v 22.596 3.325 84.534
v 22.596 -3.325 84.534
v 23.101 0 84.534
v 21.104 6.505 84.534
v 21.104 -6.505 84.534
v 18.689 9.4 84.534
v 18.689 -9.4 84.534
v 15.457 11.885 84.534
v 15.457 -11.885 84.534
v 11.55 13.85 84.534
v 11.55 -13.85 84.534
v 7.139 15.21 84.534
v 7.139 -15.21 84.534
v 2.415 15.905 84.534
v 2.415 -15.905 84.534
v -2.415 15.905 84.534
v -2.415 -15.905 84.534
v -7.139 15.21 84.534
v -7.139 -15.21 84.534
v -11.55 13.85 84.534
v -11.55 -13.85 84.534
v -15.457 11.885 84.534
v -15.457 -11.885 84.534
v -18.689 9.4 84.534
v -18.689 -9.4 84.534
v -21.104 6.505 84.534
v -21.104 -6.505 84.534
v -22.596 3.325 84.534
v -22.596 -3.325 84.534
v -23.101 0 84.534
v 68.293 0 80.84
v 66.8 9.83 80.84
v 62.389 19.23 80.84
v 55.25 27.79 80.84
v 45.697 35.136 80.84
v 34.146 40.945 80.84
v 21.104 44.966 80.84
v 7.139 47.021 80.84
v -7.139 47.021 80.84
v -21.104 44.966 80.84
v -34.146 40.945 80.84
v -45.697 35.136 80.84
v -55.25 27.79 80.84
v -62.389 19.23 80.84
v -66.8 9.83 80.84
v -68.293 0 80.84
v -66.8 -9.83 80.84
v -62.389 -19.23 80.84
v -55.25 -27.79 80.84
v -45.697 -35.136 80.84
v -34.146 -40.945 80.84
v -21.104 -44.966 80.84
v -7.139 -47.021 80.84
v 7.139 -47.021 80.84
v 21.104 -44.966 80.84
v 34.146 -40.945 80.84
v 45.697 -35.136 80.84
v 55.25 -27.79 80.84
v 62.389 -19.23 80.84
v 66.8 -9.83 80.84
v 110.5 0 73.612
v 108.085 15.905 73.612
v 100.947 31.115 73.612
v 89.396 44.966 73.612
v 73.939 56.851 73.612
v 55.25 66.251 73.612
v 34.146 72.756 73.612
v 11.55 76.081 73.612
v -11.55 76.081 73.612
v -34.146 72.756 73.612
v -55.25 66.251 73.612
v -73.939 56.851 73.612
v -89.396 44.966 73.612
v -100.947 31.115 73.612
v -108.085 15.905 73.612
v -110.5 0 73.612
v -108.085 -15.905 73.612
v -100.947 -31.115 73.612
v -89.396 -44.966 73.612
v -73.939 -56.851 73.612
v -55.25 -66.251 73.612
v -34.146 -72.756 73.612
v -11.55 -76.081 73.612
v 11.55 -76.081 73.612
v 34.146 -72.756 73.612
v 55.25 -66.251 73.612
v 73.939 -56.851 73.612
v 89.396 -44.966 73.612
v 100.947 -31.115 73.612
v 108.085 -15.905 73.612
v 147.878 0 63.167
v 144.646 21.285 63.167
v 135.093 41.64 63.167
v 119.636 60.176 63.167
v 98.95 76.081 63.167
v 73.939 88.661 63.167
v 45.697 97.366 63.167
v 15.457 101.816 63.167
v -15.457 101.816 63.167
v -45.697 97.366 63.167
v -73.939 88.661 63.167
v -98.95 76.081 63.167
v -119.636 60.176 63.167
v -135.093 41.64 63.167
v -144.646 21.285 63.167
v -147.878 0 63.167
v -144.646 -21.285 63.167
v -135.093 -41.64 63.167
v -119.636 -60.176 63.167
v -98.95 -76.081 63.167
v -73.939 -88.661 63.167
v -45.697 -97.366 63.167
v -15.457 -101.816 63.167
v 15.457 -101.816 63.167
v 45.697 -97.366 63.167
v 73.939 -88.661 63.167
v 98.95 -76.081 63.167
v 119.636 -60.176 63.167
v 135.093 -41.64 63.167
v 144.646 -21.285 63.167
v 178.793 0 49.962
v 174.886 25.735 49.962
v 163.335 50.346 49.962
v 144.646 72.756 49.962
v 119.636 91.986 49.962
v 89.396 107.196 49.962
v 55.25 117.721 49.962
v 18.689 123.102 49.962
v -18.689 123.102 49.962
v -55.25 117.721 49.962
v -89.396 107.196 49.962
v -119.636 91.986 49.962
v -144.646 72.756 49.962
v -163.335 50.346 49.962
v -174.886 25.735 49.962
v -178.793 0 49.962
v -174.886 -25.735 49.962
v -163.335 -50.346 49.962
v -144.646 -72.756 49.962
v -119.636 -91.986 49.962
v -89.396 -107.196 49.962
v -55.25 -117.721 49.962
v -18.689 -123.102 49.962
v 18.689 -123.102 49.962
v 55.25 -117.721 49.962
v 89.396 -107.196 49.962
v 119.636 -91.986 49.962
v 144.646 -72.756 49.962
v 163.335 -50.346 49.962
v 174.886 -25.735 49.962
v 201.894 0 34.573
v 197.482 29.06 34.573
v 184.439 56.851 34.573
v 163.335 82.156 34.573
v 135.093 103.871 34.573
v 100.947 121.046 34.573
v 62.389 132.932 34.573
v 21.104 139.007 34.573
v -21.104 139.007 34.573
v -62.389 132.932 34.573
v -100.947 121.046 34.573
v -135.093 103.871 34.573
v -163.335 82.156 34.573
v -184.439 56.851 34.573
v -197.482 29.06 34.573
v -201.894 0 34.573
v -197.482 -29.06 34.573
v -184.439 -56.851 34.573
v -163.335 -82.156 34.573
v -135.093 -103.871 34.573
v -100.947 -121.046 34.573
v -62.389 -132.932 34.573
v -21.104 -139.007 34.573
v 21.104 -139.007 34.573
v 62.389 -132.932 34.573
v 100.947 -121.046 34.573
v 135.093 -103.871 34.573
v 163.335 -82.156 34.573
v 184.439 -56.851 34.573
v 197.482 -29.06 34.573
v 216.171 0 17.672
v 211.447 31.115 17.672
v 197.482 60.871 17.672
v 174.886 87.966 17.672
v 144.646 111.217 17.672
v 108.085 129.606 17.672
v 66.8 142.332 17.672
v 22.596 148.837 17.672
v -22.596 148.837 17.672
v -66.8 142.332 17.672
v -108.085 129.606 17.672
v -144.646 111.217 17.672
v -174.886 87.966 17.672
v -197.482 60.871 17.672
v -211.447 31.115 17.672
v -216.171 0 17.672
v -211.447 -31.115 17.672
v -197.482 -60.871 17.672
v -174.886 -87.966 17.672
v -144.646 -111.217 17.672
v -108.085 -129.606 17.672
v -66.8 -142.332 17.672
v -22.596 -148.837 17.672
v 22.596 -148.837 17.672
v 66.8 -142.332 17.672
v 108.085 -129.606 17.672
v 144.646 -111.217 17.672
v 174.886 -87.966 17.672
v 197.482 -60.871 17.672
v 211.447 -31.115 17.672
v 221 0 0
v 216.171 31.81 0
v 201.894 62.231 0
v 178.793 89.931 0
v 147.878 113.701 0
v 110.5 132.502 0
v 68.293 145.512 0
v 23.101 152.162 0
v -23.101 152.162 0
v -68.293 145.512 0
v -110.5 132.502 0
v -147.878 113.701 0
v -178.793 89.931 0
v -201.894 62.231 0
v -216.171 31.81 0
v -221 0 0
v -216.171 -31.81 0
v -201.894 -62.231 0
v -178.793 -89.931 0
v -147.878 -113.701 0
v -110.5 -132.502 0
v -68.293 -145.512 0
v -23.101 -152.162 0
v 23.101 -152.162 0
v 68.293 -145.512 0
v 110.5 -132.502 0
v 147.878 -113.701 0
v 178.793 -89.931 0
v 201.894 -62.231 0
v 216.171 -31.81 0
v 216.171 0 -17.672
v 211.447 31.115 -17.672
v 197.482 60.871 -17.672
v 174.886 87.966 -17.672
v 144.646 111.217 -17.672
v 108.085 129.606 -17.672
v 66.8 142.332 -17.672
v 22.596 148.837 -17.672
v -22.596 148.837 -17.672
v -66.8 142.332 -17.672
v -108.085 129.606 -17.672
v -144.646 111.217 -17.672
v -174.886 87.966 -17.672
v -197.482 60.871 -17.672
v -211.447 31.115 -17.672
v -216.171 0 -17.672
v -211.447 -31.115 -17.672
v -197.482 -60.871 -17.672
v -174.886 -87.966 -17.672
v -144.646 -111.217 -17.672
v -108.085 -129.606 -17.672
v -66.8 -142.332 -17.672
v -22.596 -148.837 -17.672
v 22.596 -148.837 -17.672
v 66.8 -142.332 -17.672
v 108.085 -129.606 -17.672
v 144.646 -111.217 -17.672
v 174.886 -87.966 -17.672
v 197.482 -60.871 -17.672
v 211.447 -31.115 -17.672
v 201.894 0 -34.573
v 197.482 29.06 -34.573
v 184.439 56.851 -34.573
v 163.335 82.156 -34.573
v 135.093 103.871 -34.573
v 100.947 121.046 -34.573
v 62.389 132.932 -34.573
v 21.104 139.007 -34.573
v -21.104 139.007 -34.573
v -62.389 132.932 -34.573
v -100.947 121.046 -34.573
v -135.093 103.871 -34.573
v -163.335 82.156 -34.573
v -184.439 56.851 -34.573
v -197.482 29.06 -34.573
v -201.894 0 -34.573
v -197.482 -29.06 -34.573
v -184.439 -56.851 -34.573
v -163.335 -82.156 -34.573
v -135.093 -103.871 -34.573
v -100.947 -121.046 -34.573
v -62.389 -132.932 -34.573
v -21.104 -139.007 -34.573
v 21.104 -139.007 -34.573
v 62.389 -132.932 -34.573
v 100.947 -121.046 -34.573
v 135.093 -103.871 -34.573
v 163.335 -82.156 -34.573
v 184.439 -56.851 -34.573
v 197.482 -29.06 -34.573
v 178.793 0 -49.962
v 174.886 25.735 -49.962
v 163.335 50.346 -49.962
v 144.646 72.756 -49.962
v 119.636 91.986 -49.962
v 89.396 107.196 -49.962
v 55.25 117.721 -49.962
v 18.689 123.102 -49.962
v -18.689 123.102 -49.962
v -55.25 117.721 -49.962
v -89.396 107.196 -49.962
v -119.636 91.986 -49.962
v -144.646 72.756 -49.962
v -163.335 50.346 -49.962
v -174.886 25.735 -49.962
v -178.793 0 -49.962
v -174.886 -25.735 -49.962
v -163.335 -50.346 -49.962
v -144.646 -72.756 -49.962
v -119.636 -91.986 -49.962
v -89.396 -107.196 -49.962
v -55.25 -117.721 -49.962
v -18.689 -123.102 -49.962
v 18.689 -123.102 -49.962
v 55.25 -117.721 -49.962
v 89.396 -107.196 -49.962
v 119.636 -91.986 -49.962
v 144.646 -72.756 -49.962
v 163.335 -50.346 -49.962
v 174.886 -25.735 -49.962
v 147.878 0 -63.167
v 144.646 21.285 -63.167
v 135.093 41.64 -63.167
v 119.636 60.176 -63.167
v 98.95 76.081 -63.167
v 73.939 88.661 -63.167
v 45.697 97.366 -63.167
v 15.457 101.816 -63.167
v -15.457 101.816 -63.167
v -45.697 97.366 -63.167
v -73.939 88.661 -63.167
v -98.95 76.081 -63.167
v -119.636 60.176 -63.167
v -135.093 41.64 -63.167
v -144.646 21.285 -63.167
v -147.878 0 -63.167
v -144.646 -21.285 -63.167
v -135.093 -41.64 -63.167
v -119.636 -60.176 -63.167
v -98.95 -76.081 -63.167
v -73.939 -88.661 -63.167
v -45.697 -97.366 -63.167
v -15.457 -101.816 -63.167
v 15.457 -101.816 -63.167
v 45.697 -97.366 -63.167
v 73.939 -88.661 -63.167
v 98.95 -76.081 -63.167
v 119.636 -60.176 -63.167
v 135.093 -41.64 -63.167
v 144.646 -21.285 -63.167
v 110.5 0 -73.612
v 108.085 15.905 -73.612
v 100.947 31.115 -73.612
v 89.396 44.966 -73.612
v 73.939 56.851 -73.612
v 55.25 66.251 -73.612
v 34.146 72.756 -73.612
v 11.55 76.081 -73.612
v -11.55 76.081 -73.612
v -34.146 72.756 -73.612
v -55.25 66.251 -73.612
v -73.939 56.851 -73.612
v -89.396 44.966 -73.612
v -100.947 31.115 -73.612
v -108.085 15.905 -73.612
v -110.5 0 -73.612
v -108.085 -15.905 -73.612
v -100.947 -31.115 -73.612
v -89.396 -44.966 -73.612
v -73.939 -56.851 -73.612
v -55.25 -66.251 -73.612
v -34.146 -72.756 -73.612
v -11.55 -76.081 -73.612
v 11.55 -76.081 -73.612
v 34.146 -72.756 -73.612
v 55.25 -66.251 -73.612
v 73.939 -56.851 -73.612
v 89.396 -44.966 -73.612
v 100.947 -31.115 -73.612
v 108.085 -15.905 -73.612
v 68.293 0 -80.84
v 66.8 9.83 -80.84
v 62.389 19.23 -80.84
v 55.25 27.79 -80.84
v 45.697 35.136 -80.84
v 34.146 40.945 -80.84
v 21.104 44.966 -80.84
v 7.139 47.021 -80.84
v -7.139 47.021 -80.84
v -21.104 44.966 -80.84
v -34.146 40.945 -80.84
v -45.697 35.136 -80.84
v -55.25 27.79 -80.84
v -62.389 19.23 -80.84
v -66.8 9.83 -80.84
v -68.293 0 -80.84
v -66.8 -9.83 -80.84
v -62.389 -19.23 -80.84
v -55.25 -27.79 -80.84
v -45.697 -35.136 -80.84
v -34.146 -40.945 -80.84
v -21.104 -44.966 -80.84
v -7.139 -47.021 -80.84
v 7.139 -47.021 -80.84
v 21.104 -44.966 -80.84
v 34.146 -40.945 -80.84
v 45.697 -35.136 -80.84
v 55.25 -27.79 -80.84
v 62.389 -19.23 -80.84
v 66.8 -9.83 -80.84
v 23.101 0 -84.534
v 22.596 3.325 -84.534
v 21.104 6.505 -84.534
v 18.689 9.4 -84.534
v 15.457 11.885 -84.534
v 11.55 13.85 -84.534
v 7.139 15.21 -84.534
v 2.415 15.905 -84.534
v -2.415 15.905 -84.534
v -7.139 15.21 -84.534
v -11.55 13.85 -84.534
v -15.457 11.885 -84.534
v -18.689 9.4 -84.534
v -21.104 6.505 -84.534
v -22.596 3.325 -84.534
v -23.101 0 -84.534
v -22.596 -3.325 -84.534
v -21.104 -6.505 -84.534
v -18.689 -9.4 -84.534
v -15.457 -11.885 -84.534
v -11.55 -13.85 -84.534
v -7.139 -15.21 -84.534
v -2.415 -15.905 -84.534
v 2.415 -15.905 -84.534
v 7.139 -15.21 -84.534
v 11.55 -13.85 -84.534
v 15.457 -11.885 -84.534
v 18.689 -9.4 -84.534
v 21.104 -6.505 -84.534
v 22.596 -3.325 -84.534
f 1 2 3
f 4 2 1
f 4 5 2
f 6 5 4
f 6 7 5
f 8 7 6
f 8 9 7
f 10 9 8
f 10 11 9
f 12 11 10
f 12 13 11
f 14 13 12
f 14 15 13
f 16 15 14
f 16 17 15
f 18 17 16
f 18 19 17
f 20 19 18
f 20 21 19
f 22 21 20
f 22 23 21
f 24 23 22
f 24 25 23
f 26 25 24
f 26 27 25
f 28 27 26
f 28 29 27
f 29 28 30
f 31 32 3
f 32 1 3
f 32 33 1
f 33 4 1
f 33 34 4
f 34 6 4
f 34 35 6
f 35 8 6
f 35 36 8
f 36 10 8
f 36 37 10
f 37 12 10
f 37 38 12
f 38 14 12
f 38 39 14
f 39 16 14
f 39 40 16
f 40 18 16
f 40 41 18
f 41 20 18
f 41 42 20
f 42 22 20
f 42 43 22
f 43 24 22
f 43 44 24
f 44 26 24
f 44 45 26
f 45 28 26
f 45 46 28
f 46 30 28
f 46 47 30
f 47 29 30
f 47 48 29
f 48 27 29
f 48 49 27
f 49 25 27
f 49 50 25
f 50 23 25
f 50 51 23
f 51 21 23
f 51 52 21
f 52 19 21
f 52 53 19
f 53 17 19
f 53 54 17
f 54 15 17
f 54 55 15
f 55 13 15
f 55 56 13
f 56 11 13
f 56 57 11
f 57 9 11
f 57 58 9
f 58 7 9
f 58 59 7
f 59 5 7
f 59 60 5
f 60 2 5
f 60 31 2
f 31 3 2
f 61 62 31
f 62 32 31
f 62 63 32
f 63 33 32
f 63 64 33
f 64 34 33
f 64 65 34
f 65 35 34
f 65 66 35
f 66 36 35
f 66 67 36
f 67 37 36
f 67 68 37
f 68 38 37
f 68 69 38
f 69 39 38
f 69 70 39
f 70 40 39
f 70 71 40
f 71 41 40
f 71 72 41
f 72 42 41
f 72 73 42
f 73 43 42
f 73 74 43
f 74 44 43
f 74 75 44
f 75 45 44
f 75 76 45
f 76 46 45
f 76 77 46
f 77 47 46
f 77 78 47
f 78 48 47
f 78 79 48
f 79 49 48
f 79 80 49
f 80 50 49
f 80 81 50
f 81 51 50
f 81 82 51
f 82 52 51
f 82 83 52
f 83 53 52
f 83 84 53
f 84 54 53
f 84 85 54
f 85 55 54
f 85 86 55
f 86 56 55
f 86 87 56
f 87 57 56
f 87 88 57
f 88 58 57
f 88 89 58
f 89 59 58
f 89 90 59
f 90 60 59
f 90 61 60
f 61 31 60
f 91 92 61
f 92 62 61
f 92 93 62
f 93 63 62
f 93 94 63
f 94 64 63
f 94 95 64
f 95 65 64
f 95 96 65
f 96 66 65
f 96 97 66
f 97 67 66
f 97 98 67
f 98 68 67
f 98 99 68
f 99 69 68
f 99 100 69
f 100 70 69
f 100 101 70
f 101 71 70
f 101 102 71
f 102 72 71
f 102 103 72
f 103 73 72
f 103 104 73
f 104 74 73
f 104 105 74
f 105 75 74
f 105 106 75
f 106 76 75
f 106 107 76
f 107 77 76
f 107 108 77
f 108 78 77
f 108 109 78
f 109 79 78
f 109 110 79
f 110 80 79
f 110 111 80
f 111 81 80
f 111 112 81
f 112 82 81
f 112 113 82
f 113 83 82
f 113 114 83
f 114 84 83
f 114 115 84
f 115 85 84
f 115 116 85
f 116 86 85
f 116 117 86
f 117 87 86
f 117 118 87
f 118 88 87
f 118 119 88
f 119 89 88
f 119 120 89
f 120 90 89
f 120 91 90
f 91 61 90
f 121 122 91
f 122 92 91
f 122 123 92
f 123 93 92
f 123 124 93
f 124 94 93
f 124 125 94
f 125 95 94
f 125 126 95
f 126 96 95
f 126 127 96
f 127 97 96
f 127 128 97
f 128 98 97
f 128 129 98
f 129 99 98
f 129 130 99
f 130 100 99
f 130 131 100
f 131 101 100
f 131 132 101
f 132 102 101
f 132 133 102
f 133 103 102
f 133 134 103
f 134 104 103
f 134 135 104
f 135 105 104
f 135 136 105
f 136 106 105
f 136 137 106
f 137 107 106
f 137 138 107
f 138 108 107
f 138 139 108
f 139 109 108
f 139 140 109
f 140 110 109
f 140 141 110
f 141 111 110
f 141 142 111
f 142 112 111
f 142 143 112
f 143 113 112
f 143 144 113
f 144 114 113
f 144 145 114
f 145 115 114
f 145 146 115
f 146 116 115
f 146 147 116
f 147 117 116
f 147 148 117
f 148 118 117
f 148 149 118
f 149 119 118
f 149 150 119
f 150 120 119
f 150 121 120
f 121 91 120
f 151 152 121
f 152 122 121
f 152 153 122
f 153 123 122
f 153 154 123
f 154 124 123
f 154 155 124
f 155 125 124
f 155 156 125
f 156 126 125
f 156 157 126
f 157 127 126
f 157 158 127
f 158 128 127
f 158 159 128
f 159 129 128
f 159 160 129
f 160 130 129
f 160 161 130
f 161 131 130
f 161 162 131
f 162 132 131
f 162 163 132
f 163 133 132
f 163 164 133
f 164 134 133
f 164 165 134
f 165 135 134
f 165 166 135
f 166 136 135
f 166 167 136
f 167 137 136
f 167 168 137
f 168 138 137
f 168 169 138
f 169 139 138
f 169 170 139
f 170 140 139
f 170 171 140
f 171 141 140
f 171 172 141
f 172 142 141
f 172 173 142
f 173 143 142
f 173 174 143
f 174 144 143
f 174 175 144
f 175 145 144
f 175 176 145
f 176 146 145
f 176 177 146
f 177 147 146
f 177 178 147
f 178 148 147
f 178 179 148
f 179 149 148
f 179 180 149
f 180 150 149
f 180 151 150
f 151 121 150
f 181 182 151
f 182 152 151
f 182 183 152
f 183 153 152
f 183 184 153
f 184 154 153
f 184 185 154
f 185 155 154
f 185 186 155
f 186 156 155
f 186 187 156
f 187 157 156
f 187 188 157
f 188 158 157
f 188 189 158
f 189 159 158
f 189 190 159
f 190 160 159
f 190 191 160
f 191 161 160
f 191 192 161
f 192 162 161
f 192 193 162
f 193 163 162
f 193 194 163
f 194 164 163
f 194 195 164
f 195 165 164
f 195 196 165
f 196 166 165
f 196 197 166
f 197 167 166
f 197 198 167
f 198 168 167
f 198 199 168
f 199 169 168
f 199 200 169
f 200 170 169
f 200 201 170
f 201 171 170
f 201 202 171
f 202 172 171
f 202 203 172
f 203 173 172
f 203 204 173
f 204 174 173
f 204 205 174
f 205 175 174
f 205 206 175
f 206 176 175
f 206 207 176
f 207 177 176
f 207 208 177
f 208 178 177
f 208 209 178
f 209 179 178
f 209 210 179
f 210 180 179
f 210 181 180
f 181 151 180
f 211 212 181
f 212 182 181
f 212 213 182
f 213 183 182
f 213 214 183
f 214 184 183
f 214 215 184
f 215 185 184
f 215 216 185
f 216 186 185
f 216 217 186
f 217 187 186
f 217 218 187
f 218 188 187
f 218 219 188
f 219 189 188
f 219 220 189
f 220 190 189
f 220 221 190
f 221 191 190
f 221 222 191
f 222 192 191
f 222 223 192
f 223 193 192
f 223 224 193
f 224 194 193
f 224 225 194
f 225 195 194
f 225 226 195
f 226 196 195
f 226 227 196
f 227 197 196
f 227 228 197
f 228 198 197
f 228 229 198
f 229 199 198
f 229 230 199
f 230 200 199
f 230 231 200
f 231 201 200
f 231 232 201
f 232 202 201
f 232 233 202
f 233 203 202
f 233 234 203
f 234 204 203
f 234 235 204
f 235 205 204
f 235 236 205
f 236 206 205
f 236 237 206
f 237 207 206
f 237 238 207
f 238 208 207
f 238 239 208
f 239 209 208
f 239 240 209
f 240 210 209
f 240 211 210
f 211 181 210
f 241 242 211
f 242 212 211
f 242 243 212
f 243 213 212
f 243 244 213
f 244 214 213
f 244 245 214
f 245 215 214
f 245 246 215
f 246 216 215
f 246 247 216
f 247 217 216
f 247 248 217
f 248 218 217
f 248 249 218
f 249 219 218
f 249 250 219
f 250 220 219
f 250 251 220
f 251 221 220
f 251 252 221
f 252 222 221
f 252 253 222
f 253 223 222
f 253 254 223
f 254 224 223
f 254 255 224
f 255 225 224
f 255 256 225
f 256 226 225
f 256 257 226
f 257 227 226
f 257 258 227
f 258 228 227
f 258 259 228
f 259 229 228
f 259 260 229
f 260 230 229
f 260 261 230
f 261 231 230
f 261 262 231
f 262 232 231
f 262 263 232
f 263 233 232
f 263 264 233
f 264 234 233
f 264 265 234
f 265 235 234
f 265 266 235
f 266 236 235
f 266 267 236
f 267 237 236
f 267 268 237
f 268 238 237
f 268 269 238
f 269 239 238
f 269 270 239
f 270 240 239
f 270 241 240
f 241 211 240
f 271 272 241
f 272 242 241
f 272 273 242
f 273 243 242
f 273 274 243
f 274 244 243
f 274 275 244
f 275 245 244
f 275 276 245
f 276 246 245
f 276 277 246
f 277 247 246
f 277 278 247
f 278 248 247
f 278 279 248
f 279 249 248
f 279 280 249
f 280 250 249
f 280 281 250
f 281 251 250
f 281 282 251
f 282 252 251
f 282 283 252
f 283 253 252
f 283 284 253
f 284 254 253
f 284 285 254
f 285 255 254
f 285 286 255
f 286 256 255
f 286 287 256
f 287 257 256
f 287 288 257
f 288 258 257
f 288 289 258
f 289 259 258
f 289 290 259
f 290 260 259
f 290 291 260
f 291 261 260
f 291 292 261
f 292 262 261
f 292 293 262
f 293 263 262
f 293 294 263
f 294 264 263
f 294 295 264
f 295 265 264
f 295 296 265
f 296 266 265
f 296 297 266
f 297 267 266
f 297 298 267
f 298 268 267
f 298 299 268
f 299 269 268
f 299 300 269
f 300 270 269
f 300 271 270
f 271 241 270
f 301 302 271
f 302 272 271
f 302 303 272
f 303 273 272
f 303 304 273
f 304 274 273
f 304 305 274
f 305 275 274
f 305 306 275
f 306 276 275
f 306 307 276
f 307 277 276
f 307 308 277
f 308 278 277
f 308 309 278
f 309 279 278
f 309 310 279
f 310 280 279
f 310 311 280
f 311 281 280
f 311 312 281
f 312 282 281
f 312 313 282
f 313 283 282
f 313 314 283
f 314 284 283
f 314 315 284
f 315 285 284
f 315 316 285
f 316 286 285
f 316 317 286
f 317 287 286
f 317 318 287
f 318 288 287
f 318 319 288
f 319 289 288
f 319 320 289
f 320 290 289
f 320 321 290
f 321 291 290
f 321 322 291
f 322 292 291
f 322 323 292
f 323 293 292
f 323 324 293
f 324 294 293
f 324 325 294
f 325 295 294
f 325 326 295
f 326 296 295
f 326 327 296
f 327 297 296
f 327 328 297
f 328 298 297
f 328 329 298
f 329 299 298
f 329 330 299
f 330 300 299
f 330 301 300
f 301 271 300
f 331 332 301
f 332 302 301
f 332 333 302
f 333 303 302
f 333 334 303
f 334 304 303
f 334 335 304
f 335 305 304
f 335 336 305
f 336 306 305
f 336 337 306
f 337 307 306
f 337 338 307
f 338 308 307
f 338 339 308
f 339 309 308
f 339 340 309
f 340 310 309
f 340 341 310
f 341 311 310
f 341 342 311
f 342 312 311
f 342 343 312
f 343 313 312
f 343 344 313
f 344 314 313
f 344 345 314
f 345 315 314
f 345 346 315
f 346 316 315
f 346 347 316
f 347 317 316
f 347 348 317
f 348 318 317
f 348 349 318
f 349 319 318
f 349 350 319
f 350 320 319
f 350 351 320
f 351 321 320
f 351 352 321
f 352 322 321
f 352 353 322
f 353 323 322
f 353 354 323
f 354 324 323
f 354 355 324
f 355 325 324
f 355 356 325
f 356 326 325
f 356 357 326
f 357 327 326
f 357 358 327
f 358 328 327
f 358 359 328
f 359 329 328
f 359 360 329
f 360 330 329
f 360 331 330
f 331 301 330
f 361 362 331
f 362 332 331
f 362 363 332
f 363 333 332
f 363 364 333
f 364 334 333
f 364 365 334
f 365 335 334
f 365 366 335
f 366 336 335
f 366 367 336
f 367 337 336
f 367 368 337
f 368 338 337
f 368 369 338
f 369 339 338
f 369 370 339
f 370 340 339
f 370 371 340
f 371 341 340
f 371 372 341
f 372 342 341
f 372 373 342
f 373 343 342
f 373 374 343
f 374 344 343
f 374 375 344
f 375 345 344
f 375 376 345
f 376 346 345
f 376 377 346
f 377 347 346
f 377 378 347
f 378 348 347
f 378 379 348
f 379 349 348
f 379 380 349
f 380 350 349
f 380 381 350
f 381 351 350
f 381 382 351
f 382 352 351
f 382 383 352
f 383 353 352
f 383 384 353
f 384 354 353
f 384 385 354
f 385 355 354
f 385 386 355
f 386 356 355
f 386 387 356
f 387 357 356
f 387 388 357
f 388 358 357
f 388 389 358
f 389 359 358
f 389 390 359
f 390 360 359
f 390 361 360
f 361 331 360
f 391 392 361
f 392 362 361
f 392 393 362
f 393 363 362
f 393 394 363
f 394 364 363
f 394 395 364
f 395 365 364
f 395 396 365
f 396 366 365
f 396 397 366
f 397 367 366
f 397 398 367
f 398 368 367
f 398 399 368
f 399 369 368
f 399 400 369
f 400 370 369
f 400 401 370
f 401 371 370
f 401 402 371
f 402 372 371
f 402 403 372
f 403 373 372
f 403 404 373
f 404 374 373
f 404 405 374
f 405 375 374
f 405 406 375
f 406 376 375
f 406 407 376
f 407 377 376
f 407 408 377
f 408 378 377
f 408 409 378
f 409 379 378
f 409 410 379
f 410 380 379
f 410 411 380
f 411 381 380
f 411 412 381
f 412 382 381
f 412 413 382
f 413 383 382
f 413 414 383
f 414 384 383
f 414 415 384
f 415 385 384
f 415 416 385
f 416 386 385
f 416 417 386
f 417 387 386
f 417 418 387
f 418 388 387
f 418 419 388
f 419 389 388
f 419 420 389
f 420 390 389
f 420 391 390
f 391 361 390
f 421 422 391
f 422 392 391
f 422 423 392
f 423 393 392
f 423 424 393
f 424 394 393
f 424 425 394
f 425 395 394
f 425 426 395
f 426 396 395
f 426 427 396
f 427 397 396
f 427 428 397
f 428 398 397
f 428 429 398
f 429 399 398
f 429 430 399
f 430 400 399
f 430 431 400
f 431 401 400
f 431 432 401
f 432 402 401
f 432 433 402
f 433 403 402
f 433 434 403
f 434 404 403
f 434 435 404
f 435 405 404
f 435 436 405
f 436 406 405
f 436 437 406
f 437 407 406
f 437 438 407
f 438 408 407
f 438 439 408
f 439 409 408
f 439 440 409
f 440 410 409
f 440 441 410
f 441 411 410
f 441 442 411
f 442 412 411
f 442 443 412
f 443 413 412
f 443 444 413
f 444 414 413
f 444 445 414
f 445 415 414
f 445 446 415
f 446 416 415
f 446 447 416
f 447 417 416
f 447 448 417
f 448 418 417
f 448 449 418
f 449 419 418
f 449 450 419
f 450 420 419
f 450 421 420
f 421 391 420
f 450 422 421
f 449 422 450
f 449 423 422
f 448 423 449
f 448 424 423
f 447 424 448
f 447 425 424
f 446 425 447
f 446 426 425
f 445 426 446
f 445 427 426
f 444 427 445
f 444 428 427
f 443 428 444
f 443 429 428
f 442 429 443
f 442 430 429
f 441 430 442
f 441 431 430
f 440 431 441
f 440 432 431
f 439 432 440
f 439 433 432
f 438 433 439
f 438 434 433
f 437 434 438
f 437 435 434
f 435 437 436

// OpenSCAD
// Generated by SolidPython 1.0.1 on 2020-07-29 00:46:50


scale(v = [13, 9, 5]) {
	sphere(r = 17);
}
/***********************************************
*********      SolidPython code:      **********
************************************************
 
# import packages: SolidPython
from solid import *
from solid.utils import *
from itertools import chain, combinations, permutations


class Resize:

    def __init__(self, scad_file):
        self.scad_file = scad_file
        #self.scad_file = import_scad(scad_file)
        # cone/cylinder param:
        self.r1 = 0
        self.r2 = 0
        self.h = 0
        # rectangular prism param:
        self.w = 0
        self.l = 0
        # ellipse param:
        self.r = 0

    # import OpenScad code (file name corresponds to shape)


    # classify shape + parameters
    def assign(self, param1, param2, param3):
        if self.scad_file == 'cone.scad':
            self.r1 = param1
            self.r2 = param2
            self.h = param3
        elif self.scad_file == 'cylinder.scad':
            self.r1 = param1
            self.r2 = param2
            self.h = param3
        elif self.scad_file == 'rectangularPrism.scad':
            self.h = param1
            self.l = param2
            self.w = param3
        else:
            self.r = param1
            self.h = param2

    # resize parameters
    def iterate(self):
        x = range(3, 20, 2)
        i = 1
        if self.scad_file == 'cone.scad':
            tempList = list(permutations(x, 2))
            for temp in tempList:
                param1 = temp[0]
                param2 = temp[1]
                filepath = 'produced_scad_files/' + 'cone' + str(param1) + '_' + str(param2) + '_' + '.scad'
                scad_render_to_file(cylinder(h=param1, r1=param2, r2=0), filepath)

        elif self.scad_file == 'cylinder.scad':
            tempList = list(permutations(x, 3))
            for temp in tempList:
                param1 = temp[0]
                param2 = temp[1]
                filepath = 'produced_scad_files/' + 'cylinder' + str(param1) + '_' + str(param2) + '_' + '.scad'
                scad_render_to_file(cylinder(h=param1, r1=param2, r2=param2), filepath)

        elif self.scad_file == 'rectangularPrism.scad':
            tempList = list(permutations(x, 3))
            for temp in tempList:
                param1 = temp[0]
                param2 = temp[1]
                param3 = temp[2]
                filepath = 'produced_scad_files/' + 'rectangularPrism' + str(param1) + '_' + str(param2) + '_' + str(
                    param3) + '.scad'
                scad_render_to_file(cube(size=(param1, param2, param3)), filepath)

        elif self.scad_file == 'ellipse.scad':
            tempList = list(permutations(x, 4))
            for temp in tempList:
                param1 = temp[0]
                param2 = temp[1]
                param3 = temp[2]
                param4 = temp[3]
                filepath = 'produced_scad_files/' + 'ellipse' + str(param1) + '_' + str(param2) + '_' + str(param3) + '_' + str(param4) + '.scad'
                scad_render_to_file(scale([param1, param2, param3])(sphere(r=param4)), filepath)

    def render_to_scadfile(self):
        scad_render_to_file(scad, 'example.scad') 
 
************************************************/
